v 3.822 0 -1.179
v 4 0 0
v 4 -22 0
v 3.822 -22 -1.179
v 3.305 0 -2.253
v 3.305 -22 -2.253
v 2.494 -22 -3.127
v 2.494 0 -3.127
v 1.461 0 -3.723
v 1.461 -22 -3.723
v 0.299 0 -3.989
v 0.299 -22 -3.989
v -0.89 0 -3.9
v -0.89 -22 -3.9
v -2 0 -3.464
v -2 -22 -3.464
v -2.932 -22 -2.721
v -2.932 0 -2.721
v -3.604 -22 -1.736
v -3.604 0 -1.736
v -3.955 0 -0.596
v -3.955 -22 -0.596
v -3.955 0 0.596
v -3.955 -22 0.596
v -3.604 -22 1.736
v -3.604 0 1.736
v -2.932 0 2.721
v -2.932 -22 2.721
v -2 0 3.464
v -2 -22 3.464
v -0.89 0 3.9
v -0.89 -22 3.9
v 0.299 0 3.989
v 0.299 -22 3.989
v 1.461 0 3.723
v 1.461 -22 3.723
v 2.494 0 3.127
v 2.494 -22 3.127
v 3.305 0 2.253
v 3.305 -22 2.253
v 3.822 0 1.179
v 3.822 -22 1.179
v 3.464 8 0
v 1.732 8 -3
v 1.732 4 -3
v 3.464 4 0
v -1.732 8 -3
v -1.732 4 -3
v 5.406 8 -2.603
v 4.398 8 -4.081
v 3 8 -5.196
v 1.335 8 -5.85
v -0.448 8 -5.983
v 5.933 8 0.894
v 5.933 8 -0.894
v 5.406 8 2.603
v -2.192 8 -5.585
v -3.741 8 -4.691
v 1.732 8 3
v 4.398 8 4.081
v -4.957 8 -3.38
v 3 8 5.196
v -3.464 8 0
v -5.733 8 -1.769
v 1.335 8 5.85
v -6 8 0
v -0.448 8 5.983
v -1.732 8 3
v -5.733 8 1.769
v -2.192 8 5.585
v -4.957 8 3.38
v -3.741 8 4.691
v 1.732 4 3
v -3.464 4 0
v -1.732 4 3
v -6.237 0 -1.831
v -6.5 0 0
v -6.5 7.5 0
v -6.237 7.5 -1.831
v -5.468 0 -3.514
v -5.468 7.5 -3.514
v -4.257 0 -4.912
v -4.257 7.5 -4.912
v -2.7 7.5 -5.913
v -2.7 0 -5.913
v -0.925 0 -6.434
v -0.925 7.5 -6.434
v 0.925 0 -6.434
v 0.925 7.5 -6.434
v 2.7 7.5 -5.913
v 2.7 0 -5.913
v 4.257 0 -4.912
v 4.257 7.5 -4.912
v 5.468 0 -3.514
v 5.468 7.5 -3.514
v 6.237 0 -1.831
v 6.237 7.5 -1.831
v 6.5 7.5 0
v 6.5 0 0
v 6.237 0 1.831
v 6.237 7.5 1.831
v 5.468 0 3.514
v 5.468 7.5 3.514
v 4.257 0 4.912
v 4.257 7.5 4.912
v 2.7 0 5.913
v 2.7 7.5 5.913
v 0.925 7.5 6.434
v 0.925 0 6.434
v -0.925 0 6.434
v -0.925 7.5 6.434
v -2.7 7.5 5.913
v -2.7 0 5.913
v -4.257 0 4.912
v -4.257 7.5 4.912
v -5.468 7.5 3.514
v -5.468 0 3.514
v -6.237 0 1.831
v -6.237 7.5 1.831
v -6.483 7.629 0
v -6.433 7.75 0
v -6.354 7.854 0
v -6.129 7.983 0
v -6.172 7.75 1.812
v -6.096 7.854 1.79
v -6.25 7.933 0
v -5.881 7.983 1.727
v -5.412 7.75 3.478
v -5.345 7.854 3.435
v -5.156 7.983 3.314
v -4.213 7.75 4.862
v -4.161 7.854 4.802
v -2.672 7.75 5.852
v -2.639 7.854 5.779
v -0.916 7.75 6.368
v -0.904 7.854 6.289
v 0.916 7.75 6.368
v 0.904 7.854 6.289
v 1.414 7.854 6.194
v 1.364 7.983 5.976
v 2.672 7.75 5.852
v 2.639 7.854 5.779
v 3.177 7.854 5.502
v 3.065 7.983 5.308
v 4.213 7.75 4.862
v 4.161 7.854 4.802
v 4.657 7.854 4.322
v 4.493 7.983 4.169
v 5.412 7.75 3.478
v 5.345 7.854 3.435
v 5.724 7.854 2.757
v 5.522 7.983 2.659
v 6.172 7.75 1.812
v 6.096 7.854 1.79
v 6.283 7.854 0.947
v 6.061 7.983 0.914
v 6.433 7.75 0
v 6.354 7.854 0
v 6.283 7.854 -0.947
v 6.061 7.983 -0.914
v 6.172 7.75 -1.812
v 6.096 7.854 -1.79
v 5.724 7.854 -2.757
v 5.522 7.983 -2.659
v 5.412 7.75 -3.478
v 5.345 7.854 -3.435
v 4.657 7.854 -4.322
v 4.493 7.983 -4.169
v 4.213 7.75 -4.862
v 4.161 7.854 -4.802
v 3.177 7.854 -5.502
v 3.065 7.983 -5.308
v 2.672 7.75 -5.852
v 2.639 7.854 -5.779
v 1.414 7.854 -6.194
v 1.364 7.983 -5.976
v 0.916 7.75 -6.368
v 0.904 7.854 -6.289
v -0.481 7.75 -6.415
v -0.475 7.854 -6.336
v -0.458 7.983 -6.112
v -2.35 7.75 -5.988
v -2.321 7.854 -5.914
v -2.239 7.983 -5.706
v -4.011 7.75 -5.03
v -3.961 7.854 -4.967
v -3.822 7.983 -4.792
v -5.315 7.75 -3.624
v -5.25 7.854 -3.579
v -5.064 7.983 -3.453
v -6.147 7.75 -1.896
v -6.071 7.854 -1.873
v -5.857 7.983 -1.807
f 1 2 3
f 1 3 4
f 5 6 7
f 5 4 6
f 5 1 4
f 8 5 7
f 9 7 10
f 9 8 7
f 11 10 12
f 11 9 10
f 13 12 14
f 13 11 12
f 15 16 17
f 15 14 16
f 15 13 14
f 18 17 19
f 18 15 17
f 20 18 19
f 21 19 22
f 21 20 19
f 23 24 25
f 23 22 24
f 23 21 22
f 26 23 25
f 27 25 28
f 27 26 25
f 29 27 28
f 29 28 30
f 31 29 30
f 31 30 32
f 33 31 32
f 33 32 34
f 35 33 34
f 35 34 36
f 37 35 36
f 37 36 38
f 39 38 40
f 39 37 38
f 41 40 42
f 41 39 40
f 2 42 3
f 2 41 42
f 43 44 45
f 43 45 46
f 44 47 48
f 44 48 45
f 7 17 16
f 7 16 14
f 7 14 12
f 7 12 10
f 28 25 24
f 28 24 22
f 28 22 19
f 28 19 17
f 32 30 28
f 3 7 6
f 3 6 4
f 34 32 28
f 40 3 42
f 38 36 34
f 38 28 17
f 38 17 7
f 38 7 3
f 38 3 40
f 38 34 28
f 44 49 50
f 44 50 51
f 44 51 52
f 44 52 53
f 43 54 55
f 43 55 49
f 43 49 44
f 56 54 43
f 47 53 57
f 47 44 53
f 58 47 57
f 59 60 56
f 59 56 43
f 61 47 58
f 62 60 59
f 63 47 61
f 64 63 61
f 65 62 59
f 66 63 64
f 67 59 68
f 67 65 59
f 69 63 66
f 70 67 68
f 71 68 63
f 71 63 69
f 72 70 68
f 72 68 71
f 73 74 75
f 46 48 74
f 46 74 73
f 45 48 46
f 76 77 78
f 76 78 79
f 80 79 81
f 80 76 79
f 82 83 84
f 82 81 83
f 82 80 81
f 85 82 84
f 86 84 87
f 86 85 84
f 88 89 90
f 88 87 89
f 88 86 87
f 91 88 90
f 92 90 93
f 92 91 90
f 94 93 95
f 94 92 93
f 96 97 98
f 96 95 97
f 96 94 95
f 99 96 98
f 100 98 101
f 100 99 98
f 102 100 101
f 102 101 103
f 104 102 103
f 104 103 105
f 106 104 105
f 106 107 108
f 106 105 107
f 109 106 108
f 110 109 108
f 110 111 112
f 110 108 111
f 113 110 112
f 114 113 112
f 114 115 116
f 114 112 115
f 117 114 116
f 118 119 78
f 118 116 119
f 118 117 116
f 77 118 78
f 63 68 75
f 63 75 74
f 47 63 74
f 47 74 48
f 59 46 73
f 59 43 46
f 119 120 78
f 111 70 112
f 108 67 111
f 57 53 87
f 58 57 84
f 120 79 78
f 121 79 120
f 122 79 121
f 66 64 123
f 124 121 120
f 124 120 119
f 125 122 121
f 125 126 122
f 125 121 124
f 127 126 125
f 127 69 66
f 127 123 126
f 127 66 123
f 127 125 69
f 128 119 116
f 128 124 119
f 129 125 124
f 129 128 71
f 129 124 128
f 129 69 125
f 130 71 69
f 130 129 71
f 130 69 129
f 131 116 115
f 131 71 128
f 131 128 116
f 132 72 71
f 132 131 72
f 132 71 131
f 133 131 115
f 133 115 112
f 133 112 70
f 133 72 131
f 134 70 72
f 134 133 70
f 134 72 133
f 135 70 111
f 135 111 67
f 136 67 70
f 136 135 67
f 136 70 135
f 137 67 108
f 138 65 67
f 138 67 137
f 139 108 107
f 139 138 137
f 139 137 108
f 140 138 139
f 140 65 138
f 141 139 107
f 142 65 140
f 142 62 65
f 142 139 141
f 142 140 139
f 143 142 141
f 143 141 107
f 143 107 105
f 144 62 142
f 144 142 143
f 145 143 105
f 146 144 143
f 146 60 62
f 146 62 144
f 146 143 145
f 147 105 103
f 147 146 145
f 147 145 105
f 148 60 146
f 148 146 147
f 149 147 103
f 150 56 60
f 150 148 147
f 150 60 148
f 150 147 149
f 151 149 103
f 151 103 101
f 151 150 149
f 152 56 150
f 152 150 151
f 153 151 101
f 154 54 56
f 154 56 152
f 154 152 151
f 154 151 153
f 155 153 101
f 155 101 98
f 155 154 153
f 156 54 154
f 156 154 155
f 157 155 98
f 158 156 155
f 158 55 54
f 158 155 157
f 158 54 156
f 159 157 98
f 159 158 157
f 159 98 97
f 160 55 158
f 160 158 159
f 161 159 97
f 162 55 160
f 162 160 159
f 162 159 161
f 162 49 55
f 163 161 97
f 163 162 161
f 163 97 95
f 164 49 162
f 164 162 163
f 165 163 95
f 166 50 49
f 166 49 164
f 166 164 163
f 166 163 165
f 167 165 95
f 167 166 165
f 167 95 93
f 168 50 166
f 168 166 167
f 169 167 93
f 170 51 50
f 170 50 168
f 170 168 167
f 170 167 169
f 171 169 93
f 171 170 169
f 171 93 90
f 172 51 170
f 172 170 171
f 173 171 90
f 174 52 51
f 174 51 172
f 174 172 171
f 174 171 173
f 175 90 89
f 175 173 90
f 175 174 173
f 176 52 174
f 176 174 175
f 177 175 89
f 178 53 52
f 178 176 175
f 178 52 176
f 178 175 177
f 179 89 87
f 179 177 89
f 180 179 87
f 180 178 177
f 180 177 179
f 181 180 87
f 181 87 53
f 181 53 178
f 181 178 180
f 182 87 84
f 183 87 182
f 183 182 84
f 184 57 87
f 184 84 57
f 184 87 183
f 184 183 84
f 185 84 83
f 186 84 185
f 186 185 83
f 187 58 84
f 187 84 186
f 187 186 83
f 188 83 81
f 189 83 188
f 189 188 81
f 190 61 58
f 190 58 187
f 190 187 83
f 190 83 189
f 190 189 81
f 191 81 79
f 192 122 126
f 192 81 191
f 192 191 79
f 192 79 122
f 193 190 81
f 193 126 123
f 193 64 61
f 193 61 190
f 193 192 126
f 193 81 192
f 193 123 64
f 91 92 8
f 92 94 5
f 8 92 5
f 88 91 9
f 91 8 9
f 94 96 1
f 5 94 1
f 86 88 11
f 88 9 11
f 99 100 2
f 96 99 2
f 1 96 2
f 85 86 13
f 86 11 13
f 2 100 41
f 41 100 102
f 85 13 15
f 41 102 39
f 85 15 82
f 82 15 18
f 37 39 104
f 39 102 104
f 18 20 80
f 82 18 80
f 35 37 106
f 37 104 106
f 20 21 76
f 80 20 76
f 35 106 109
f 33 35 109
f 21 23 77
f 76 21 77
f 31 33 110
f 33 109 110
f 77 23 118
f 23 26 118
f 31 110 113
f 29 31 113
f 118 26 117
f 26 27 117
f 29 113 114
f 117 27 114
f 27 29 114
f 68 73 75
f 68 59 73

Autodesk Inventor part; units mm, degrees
ref_plane "YZ Plane" through (0, 0, 0) normal (1, 0, 0) x (0, 1, 0)
ref_plane "XZ Plane" through (0, 0, 0) normal (0, 1, 0) x (-1, 0, 0)
ref_plane "XY Plane" through (0, 0, 0) normal (0, 0, 1) x (1, 0, 0)
sketch "Cap Cross Section" plane through (0, 0, 0) normal (0, 1, 0) x (-1, 0, 0)
  circle A0 centre (0, 0) radius 6.5
  dimension "d0" = 13
extrude "Cap" add sketch "Cap Cross Section" along normal blind 8
sketch "Key Socket Cutout Outline" plane through (0, 8, 0) normal (0, 1, 0) x (1, 0, 0)
  line L0 (1.7321, 3) -> (3.4641, 0)
  line L1 (3.4641, 0) -> (1.7321, -3)
  line L2 (1.7321, -3) -> (-1.7321, -3)
  line L3 (-1.7321, -3) -> (-3.4641, 0)
  line L4 (-3.4641, 0) -> (-1.7321, 3)
  line L5 (-1.7321, 3) -> (1.7321, 3)
  point P0 (0, 0)
  point P1 (0, 0)
  dimension "d3" = 6
extrude "Key Socket Cutout" cut sketch "Key Socket Cutout Outline" against normal blind 4
sketch "Body Cross Section" plane through (0, 0, 0) normal (0, -1, 0) x (1, 0, 0)
  circle A0 centre (0, 0) radius 4
  dimension "d6" = 8
extrude "Body" add sketch "Body Cross Section" along normal blind 22
thread "Thread" size "M8x1.25" class "6g" standard "ANSI Metric M Profile" full length
fillet "Cap Fillet" radius 0.5 1 edges at (6.5, 8, 0)
properties part number "SSCF-M8-22-A4" material "Stainless Steel AISI 317"
